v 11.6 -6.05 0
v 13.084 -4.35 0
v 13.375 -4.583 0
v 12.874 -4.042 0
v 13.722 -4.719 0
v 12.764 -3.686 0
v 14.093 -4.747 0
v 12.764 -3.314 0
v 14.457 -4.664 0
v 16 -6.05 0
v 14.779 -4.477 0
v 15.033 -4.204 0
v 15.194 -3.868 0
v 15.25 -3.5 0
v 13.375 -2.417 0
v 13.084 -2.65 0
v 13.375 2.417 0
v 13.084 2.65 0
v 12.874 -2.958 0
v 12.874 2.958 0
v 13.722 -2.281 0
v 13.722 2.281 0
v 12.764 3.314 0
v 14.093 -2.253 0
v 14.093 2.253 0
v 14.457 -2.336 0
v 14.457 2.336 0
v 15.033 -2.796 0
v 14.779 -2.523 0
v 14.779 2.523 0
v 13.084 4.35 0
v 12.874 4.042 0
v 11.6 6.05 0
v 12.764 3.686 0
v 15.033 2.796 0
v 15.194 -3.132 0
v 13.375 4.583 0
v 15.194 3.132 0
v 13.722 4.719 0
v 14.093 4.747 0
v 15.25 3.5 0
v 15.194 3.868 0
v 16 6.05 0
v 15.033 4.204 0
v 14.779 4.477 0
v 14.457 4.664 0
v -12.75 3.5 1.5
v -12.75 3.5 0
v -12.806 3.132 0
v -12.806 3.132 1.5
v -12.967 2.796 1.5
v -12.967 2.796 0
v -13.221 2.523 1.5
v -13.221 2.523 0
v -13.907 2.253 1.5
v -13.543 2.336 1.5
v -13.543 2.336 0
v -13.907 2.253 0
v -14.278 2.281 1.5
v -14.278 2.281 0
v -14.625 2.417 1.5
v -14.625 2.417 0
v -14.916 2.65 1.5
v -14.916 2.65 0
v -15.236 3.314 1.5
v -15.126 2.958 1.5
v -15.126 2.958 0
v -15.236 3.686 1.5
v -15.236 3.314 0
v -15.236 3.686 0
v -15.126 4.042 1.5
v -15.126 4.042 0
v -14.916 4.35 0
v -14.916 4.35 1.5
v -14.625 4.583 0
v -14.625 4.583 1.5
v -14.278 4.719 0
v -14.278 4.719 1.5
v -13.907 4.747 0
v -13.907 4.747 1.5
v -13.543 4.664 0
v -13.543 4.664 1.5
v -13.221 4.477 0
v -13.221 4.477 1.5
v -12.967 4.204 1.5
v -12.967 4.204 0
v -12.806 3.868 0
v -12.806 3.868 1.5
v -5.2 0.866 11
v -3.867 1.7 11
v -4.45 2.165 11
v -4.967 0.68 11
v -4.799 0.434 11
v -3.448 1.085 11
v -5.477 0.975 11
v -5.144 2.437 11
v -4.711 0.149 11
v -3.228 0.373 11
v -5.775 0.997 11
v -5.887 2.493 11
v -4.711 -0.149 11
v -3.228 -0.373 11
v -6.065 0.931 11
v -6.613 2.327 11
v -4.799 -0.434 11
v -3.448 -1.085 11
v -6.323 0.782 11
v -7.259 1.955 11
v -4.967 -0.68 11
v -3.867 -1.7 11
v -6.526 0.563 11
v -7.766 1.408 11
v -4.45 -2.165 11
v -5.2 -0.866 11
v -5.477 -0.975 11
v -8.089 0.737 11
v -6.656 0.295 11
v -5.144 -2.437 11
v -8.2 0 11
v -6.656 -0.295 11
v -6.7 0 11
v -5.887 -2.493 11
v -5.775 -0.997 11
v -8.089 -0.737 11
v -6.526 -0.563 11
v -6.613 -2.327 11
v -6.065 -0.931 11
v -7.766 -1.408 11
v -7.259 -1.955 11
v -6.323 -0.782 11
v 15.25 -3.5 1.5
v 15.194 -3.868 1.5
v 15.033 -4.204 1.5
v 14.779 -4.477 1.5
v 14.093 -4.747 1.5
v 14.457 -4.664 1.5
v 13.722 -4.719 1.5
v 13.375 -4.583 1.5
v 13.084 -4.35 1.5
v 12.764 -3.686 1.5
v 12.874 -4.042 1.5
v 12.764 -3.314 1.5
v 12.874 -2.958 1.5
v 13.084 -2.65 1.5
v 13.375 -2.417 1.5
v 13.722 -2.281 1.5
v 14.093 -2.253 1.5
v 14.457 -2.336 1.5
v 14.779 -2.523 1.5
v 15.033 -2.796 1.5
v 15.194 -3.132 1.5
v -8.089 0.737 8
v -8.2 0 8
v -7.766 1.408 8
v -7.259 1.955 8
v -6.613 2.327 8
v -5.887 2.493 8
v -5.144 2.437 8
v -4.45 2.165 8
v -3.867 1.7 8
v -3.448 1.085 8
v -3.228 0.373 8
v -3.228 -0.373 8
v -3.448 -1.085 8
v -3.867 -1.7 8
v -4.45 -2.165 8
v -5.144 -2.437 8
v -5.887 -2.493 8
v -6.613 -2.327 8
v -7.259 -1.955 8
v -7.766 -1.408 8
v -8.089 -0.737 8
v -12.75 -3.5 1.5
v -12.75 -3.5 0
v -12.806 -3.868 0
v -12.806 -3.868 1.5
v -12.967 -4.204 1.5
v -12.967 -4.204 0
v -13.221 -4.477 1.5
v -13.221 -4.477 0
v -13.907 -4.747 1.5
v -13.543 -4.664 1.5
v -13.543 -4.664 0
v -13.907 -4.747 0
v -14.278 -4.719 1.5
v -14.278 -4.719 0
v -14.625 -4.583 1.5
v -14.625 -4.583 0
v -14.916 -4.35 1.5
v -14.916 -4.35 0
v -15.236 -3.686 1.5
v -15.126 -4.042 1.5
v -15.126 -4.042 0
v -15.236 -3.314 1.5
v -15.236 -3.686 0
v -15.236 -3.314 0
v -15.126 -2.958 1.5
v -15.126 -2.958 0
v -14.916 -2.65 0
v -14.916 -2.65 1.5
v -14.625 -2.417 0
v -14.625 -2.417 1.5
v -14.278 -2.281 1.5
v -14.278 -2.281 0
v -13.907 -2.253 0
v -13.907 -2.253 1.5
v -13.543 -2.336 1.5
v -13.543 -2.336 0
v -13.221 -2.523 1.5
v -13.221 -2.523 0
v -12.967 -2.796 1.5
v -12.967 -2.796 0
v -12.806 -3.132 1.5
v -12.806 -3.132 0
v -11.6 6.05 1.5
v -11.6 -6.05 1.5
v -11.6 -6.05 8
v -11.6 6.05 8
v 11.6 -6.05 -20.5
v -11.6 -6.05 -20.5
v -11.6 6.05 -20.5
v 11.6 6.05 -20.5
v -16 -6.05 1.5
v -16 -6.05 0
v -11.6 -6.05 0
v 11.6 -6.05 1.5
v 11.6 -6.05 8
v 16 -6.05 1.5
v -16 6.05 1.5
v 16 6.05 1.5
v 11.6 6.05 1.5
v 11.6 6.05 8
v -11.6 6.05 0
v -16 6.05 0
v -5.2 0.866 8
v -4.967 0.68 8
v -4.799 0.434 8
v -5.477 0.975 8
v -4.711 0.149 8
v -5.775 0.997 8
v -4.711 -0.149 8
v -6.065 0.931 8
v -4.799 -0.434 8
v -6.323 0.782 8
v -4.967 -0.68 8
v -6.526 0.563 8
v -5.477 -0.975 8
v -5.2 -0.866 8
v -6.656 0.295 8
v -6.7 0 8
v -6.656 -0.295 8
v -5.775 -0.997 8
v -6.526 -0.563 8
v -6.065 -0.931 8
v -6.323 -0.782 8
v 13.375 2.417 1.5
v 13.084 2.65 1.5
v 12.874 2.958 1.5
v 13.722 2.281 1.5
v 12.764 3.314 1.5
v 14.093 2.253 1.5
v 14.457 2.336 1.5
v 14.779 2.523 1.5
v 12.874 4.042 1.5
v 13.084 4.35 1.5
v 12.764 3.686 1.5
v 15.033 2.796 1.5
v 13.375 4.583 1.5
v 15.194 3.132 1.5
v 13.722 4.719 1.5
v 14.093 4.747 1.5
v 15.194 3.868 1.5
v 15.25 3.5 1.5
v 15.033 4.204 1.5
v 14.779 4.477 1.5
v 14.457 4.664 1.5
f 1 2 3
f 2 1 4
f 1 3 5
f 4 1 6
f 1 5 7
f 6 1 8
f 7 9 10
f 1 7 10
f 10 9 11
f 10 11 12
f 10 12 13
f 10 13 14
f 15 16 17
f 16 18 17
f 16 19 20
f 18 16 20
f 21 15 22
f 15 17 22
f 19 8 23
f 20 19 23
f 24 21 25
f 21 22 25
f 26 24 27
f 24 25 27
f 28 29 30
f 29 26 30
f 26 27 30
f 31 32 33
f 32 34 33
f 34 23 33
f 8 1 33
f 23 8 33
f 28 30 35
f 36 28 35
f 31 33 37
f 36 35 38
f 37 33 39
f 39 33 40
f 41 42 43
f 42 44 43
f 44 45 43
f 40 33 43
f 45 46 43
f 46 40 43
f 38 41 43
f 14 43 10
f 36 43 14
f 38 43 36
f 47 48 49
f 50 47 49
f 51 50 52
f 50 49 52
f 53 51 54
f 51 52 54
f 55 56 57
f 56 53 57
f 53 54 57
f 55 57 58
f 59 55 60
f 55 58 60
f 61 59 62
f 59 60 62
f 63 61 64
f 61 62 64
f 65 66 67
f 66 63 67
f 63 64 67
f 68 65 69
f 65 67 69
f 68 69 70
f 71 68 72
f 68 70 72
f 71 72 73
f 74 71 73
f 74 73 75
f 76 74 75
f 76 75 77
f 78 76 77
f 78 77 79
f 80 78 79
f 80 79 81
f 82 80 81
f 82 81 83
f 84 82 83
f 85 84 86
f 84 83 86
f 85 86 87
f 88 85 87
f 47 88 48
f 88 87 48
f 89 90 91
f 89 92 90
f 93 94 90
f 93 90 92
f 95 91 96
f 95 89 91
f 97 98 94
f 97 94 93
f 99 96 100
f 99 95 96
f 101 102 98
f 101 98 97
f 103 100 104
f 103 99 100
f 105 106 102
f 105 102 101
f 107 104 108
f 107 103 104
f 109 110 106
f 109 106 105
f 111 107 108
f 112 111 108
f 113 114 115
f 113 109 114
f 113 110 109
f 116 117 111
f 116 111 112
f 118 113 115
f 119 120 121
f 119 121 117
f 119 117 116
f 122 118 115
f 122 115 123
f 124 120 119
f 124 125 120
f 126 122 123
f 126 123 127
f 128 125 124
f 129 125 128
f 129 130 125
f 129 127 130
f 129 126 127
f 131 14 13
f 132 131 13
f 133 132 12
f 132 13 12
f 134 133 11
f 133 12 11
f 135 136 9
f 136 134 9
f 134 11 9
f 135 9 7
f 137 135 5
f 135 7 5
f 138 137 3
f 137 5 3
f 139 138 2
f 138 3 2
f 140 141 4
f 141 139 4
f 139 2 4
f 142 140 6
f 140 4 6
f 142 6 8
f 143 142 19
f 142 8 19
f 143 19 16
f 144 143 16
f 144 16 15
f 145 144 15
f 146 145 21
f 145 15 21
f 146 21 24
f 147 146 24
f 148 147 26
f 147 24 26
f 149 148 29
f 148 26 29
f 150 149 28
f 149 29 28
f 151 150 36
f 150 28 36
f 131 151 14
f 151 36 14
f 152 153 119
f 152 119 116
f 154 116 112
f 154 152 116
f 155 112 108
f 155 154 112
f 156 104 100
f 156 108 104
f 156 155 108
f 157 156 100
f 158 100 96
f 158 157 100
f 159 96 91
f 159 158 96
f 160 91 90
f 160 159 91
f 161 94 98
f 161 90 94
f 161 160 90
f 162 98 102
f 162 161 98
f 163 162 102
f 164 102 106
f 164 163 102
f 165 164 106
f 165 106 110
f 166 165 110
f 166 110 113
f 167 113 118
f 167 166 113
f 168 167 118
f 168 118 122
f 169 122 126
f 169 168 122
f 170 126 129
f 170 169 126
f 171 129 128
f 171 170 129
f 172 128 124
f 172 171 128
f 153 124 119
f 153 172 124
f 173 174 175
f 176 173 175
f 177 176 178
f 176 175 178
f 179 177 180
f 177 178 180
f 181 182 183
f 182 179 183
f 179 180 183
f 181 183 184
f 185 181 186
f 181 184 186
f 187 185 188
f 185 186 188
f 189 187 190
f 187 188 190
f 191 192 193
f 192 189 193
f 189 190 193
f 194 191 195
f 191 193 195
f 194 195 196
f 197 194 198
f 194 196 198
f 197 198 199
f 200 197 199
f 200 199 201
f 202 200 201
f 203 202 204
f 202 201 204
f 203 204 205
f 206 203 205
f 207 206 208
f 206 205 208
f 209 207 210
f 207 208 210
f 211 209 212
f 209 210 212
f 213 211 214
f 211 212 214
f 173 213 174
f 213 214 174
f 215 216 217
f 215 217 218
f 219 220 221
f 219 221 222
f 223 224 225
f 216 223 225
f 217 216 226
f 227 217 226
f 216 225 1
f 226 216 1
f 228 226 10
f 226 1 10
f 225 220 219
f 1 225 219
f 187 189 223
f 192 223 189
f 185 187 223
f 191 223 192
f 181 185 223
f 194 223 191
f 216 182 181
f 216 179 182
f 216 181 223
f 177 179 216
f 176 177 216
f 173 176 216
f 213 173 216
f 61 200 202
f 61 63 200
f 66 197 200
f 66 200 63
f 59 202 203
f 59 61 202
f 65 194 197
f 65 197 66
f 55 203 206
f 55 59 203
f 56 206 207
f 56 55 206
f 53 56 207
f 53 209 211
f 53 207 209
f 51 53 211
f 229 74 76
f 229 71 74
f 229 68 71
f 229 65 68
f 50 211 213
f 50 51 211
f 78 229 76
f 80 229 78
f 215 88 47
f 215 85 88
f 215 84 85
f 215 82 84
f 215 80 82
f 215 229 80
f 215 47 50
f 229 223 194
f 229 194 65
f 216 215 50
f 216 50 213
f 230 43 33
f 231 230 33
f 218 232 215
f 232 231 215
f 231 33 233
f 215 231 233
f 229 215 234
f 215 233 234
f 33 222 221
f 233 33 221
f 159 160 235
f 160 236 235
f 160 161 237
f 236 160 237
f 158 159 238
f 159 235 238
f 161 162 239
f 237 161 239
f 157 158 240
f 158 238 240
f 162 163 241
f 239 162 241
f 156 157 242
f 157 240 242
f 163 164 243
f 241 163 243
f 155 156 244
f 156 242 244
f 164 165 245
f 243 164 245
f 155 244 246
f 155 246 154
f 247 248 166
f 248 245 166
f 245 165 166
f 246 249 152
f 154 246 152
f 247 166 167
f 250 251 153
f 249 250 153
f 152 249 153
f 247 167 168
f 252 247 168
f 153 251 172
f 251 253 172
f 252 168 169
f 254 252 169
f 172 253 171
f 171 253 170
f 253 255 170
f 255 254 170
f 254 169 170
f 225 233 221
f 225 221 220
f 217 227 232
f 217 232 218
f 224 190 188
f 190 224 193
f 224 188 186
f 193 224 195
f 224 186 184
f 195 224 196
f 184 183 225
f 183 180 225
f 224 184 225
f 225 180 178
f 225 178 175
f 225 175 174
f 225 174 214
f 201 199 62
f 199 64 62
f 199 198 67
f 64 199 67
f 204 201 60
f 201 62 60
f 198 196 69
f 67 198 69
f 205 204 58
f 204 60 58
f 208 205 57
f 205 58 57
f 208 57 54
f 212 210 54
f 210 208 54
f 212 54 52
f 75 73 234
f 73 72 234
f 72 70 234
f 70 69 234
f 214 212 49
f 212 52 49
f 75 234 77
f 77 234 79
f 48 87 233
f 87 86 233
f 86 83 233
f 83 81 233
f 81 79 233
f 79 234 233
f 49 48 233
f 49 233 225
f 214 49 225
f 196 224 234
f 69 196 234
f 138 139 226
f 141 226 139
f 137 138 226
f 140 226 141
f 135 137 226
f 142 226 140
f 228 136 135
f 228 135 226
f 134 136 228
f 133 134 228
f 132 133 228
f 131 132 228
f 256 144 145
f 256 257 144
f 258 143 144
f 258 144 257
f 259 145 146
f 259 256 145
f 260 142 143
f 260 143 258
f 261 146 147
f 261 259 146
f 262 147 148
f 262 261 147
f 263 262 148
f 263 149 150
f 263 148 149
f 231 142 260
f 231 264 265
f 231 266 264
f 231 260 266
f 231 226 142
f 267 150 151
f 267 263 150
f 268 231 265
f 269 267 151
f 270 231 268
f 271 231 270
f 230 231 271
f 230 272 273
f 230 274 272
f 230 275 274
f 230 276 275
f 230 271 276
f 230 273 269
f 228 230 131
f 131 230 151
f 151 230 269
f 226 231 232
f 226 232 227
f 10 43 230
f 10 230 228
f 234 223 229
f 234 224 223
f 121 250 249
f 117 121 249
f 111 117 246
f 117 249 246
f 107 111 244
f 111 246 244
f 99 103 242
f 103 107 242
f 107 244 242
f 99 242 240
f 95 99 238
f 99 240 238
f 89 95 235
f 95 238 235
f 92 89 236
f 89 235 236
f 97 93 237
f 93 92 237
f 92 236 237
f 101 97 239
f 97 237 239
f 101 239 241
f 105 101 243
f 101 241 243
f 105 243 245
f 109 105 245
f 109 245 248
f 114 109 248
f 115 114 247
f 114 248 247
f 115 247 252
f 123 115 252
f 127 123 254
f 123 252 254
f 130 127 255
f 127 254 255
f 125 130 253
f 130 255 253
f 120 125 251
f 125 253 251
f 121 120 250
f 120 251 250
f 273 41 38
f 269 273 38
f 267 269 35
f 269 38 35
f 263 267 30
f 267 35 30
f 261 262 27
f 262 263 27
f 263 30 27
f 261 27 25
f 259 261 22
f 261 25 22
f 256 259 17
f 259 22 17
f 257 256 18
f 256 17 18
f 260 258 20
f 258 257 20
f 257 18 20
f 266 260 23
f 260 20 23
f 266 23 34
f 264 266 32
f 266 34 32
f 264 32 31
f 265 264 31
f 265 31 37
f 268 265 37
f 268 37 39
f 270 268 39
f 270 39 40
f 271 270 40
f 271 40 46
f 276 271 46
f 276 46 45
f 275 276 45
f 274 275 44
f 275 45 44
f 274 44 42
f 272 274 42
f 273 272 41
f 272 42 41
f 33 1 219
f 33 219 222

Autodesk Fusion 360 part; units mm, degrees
sketch "草图1" plane through (0, 0, 0) normal (0, 0, 1) x (1, 0, 0)
  line L0 (16, -6.05) -> (-16, -6.05)
  line L1 (-16, -6.05) -> (-16, 6.05)
  line L2 (-16, 6.05) -> (16, 6.05)
  line L3 (16, 6.05) -> (16, -6.05)
  line L4 (16, -6.05) -> (-16, 6.05) construction
  line L5 (-16, -6.05) -> (16, 6.05) construction
  line L6 (-18, 0) -> (25, 0)
  line L7 (0, 20) -> (0, -24)
  circle A0 centre (-14, 3.5) radius 1.25
  circle A1 centre (14, 3.5) radius 1.25
  circle A2 centre (-14, -3.5) radius 1.25
  circle A3 centre (14, -3.5) radius 1.25
  dimension "d1" = 12.1
  dimension "d2" = 32
  dimension "d4" = 2.5
  dimension "d5" = 28
  dimension "d6" = 7
extrude "拉伸1" add sketch "草图1" along normal blind 1.5 makes body 1
sketch "草图2" plane through (0, 0, 0) normal (0, 0, -1) x (1, 0, 0)
  circle A0 centre (14, -3.5) radius 1.25
  circle A1 centre (-14, -3.5) radius 1.25
  circle A2 centre (-14, 3.5) radius 1.25
  circle A3 centre (14, 3.5) radius 1.25
  line L0 (-16, -6.05) -> (16, -6.05)
  line L1 (16, -6.05) -> (16, 6.05)
  line L2 (16, 6.05) -> (-16, 6.05)
  line L3 (-16, 6.05) -> (-16, -6.05)
  line L4 (11.6, -6.05) -> (-11.6, -6.05)
  line L5 (-11.6, -6.05) -> (-11.6, 6.05)
  line L6 (-11.6, 6.05) -> (11.6, 6.05)
  line L7 (11.6, 6.05) -> (11.6, -6.05)
  line L8 (11.6, -6.05) -> (-11.6, 6.05) construction
  line L9 (-11.6, -6.05) -> (11.6, 6.05) construction
  dimension "d9" = 23.2
  dimension "d10" = 12.1
extrude "拉伸2" add sketch "草图2" along normal blind 20.5 contours L0 L2 L4 L5 L6 L7 bodies 1
sketch "草图3" plane through (0, 0, 1.5) normal (0, 0, 1) x (-1, 0, 0)
  circle A0 centre (14, 3.5) radius 1.25
  circle A1 centre (-14, 3.5) radius 1.25
  circle A2 centre (-14, -3.5) radius 1.25
  circle A3 centre (14, -3.5) radius 1.25
  line L0 (-16, -6.05) -> (16, -6.05)
  line L1 (16, -6.05) -> (16, 6.05)
  line L2 (16, 6.05) -> (-16, 6.05)
  line L3 (-16, 6.05) -> (-16, -6.05)
  line L4 (-11.6, 6.05) -> (11.6, 6.05)
  line L5 (11.6, 6.05) -> (11.6, -6.05)
  line L6 (11.6, -6.05) -> (-11.6, -6.05)
  line L7 (-11.6, -6.05) -> (-11.6, 6.05)
  line L8 (-11.6, 6.05) -> (11.6, -6.05) construction
  line L9 (11.6, 6.05) -> (-11.6, -6.05) construction
  dimension "d13" = 23.2
  dimension "d14" = 12.1
extrude "拉伸3" add sketch "草图3" along normal blind 6.5 contours L0 L2 L4 L5 L6 L7 bodies 1
sketch "草图4" plane through (0, 0, 8) normal (0, 0, 1) x (-1, 0, 0)
  line L0 (-11.6, -6.05) -> (11.6, -6.05)
  line L1 (11.6, -6.05) -> (11.6, 6.05)
  line L2 (11.6, 6.05) -> (-11.6, 6.05)
  line L3 (-11.6, 6.05) -> (-11.6, -6.05)
  line L4 (11.6, 6.05) -> (11.6, -6.05)
  line L5 (11.6, -6.05) -> (16, -6.05)
  line L6 (16, -6.05) -> (16, 6.05)
  line L7 (16, 6.05) -> (11.6, 6.05)
  circle A0 centre (14, -3.5) radius 1.25
  circle A1 centre (14, 3.5) radius 1.25
  line L8 (-11.6, -6.05) -> (-11.6, 6.05)
  line L9 (-11.6, 6.05) -> (-16, 6.05)
  line L10 (-16, 6.05) -> (-16, -6.05)
  line L11 (-16, -6.05) -> (-11.6, -6.05)
  circle A2 centre (-14, 3.5) radius 1.25
  circle A3 centre (-14, -3.5) radius 1.25
  circle A4 centre (5.7, 0) radius 2.5
  circle A5 centre (5.7, 0) radius 1
  dimension "d17" = 5
  dimension "d18" = 8.3
  dimension "d19" = 2
extrude "拉伸4" add sketch "草图4" along normal blind 3 separate body contours A4 makes body 2
